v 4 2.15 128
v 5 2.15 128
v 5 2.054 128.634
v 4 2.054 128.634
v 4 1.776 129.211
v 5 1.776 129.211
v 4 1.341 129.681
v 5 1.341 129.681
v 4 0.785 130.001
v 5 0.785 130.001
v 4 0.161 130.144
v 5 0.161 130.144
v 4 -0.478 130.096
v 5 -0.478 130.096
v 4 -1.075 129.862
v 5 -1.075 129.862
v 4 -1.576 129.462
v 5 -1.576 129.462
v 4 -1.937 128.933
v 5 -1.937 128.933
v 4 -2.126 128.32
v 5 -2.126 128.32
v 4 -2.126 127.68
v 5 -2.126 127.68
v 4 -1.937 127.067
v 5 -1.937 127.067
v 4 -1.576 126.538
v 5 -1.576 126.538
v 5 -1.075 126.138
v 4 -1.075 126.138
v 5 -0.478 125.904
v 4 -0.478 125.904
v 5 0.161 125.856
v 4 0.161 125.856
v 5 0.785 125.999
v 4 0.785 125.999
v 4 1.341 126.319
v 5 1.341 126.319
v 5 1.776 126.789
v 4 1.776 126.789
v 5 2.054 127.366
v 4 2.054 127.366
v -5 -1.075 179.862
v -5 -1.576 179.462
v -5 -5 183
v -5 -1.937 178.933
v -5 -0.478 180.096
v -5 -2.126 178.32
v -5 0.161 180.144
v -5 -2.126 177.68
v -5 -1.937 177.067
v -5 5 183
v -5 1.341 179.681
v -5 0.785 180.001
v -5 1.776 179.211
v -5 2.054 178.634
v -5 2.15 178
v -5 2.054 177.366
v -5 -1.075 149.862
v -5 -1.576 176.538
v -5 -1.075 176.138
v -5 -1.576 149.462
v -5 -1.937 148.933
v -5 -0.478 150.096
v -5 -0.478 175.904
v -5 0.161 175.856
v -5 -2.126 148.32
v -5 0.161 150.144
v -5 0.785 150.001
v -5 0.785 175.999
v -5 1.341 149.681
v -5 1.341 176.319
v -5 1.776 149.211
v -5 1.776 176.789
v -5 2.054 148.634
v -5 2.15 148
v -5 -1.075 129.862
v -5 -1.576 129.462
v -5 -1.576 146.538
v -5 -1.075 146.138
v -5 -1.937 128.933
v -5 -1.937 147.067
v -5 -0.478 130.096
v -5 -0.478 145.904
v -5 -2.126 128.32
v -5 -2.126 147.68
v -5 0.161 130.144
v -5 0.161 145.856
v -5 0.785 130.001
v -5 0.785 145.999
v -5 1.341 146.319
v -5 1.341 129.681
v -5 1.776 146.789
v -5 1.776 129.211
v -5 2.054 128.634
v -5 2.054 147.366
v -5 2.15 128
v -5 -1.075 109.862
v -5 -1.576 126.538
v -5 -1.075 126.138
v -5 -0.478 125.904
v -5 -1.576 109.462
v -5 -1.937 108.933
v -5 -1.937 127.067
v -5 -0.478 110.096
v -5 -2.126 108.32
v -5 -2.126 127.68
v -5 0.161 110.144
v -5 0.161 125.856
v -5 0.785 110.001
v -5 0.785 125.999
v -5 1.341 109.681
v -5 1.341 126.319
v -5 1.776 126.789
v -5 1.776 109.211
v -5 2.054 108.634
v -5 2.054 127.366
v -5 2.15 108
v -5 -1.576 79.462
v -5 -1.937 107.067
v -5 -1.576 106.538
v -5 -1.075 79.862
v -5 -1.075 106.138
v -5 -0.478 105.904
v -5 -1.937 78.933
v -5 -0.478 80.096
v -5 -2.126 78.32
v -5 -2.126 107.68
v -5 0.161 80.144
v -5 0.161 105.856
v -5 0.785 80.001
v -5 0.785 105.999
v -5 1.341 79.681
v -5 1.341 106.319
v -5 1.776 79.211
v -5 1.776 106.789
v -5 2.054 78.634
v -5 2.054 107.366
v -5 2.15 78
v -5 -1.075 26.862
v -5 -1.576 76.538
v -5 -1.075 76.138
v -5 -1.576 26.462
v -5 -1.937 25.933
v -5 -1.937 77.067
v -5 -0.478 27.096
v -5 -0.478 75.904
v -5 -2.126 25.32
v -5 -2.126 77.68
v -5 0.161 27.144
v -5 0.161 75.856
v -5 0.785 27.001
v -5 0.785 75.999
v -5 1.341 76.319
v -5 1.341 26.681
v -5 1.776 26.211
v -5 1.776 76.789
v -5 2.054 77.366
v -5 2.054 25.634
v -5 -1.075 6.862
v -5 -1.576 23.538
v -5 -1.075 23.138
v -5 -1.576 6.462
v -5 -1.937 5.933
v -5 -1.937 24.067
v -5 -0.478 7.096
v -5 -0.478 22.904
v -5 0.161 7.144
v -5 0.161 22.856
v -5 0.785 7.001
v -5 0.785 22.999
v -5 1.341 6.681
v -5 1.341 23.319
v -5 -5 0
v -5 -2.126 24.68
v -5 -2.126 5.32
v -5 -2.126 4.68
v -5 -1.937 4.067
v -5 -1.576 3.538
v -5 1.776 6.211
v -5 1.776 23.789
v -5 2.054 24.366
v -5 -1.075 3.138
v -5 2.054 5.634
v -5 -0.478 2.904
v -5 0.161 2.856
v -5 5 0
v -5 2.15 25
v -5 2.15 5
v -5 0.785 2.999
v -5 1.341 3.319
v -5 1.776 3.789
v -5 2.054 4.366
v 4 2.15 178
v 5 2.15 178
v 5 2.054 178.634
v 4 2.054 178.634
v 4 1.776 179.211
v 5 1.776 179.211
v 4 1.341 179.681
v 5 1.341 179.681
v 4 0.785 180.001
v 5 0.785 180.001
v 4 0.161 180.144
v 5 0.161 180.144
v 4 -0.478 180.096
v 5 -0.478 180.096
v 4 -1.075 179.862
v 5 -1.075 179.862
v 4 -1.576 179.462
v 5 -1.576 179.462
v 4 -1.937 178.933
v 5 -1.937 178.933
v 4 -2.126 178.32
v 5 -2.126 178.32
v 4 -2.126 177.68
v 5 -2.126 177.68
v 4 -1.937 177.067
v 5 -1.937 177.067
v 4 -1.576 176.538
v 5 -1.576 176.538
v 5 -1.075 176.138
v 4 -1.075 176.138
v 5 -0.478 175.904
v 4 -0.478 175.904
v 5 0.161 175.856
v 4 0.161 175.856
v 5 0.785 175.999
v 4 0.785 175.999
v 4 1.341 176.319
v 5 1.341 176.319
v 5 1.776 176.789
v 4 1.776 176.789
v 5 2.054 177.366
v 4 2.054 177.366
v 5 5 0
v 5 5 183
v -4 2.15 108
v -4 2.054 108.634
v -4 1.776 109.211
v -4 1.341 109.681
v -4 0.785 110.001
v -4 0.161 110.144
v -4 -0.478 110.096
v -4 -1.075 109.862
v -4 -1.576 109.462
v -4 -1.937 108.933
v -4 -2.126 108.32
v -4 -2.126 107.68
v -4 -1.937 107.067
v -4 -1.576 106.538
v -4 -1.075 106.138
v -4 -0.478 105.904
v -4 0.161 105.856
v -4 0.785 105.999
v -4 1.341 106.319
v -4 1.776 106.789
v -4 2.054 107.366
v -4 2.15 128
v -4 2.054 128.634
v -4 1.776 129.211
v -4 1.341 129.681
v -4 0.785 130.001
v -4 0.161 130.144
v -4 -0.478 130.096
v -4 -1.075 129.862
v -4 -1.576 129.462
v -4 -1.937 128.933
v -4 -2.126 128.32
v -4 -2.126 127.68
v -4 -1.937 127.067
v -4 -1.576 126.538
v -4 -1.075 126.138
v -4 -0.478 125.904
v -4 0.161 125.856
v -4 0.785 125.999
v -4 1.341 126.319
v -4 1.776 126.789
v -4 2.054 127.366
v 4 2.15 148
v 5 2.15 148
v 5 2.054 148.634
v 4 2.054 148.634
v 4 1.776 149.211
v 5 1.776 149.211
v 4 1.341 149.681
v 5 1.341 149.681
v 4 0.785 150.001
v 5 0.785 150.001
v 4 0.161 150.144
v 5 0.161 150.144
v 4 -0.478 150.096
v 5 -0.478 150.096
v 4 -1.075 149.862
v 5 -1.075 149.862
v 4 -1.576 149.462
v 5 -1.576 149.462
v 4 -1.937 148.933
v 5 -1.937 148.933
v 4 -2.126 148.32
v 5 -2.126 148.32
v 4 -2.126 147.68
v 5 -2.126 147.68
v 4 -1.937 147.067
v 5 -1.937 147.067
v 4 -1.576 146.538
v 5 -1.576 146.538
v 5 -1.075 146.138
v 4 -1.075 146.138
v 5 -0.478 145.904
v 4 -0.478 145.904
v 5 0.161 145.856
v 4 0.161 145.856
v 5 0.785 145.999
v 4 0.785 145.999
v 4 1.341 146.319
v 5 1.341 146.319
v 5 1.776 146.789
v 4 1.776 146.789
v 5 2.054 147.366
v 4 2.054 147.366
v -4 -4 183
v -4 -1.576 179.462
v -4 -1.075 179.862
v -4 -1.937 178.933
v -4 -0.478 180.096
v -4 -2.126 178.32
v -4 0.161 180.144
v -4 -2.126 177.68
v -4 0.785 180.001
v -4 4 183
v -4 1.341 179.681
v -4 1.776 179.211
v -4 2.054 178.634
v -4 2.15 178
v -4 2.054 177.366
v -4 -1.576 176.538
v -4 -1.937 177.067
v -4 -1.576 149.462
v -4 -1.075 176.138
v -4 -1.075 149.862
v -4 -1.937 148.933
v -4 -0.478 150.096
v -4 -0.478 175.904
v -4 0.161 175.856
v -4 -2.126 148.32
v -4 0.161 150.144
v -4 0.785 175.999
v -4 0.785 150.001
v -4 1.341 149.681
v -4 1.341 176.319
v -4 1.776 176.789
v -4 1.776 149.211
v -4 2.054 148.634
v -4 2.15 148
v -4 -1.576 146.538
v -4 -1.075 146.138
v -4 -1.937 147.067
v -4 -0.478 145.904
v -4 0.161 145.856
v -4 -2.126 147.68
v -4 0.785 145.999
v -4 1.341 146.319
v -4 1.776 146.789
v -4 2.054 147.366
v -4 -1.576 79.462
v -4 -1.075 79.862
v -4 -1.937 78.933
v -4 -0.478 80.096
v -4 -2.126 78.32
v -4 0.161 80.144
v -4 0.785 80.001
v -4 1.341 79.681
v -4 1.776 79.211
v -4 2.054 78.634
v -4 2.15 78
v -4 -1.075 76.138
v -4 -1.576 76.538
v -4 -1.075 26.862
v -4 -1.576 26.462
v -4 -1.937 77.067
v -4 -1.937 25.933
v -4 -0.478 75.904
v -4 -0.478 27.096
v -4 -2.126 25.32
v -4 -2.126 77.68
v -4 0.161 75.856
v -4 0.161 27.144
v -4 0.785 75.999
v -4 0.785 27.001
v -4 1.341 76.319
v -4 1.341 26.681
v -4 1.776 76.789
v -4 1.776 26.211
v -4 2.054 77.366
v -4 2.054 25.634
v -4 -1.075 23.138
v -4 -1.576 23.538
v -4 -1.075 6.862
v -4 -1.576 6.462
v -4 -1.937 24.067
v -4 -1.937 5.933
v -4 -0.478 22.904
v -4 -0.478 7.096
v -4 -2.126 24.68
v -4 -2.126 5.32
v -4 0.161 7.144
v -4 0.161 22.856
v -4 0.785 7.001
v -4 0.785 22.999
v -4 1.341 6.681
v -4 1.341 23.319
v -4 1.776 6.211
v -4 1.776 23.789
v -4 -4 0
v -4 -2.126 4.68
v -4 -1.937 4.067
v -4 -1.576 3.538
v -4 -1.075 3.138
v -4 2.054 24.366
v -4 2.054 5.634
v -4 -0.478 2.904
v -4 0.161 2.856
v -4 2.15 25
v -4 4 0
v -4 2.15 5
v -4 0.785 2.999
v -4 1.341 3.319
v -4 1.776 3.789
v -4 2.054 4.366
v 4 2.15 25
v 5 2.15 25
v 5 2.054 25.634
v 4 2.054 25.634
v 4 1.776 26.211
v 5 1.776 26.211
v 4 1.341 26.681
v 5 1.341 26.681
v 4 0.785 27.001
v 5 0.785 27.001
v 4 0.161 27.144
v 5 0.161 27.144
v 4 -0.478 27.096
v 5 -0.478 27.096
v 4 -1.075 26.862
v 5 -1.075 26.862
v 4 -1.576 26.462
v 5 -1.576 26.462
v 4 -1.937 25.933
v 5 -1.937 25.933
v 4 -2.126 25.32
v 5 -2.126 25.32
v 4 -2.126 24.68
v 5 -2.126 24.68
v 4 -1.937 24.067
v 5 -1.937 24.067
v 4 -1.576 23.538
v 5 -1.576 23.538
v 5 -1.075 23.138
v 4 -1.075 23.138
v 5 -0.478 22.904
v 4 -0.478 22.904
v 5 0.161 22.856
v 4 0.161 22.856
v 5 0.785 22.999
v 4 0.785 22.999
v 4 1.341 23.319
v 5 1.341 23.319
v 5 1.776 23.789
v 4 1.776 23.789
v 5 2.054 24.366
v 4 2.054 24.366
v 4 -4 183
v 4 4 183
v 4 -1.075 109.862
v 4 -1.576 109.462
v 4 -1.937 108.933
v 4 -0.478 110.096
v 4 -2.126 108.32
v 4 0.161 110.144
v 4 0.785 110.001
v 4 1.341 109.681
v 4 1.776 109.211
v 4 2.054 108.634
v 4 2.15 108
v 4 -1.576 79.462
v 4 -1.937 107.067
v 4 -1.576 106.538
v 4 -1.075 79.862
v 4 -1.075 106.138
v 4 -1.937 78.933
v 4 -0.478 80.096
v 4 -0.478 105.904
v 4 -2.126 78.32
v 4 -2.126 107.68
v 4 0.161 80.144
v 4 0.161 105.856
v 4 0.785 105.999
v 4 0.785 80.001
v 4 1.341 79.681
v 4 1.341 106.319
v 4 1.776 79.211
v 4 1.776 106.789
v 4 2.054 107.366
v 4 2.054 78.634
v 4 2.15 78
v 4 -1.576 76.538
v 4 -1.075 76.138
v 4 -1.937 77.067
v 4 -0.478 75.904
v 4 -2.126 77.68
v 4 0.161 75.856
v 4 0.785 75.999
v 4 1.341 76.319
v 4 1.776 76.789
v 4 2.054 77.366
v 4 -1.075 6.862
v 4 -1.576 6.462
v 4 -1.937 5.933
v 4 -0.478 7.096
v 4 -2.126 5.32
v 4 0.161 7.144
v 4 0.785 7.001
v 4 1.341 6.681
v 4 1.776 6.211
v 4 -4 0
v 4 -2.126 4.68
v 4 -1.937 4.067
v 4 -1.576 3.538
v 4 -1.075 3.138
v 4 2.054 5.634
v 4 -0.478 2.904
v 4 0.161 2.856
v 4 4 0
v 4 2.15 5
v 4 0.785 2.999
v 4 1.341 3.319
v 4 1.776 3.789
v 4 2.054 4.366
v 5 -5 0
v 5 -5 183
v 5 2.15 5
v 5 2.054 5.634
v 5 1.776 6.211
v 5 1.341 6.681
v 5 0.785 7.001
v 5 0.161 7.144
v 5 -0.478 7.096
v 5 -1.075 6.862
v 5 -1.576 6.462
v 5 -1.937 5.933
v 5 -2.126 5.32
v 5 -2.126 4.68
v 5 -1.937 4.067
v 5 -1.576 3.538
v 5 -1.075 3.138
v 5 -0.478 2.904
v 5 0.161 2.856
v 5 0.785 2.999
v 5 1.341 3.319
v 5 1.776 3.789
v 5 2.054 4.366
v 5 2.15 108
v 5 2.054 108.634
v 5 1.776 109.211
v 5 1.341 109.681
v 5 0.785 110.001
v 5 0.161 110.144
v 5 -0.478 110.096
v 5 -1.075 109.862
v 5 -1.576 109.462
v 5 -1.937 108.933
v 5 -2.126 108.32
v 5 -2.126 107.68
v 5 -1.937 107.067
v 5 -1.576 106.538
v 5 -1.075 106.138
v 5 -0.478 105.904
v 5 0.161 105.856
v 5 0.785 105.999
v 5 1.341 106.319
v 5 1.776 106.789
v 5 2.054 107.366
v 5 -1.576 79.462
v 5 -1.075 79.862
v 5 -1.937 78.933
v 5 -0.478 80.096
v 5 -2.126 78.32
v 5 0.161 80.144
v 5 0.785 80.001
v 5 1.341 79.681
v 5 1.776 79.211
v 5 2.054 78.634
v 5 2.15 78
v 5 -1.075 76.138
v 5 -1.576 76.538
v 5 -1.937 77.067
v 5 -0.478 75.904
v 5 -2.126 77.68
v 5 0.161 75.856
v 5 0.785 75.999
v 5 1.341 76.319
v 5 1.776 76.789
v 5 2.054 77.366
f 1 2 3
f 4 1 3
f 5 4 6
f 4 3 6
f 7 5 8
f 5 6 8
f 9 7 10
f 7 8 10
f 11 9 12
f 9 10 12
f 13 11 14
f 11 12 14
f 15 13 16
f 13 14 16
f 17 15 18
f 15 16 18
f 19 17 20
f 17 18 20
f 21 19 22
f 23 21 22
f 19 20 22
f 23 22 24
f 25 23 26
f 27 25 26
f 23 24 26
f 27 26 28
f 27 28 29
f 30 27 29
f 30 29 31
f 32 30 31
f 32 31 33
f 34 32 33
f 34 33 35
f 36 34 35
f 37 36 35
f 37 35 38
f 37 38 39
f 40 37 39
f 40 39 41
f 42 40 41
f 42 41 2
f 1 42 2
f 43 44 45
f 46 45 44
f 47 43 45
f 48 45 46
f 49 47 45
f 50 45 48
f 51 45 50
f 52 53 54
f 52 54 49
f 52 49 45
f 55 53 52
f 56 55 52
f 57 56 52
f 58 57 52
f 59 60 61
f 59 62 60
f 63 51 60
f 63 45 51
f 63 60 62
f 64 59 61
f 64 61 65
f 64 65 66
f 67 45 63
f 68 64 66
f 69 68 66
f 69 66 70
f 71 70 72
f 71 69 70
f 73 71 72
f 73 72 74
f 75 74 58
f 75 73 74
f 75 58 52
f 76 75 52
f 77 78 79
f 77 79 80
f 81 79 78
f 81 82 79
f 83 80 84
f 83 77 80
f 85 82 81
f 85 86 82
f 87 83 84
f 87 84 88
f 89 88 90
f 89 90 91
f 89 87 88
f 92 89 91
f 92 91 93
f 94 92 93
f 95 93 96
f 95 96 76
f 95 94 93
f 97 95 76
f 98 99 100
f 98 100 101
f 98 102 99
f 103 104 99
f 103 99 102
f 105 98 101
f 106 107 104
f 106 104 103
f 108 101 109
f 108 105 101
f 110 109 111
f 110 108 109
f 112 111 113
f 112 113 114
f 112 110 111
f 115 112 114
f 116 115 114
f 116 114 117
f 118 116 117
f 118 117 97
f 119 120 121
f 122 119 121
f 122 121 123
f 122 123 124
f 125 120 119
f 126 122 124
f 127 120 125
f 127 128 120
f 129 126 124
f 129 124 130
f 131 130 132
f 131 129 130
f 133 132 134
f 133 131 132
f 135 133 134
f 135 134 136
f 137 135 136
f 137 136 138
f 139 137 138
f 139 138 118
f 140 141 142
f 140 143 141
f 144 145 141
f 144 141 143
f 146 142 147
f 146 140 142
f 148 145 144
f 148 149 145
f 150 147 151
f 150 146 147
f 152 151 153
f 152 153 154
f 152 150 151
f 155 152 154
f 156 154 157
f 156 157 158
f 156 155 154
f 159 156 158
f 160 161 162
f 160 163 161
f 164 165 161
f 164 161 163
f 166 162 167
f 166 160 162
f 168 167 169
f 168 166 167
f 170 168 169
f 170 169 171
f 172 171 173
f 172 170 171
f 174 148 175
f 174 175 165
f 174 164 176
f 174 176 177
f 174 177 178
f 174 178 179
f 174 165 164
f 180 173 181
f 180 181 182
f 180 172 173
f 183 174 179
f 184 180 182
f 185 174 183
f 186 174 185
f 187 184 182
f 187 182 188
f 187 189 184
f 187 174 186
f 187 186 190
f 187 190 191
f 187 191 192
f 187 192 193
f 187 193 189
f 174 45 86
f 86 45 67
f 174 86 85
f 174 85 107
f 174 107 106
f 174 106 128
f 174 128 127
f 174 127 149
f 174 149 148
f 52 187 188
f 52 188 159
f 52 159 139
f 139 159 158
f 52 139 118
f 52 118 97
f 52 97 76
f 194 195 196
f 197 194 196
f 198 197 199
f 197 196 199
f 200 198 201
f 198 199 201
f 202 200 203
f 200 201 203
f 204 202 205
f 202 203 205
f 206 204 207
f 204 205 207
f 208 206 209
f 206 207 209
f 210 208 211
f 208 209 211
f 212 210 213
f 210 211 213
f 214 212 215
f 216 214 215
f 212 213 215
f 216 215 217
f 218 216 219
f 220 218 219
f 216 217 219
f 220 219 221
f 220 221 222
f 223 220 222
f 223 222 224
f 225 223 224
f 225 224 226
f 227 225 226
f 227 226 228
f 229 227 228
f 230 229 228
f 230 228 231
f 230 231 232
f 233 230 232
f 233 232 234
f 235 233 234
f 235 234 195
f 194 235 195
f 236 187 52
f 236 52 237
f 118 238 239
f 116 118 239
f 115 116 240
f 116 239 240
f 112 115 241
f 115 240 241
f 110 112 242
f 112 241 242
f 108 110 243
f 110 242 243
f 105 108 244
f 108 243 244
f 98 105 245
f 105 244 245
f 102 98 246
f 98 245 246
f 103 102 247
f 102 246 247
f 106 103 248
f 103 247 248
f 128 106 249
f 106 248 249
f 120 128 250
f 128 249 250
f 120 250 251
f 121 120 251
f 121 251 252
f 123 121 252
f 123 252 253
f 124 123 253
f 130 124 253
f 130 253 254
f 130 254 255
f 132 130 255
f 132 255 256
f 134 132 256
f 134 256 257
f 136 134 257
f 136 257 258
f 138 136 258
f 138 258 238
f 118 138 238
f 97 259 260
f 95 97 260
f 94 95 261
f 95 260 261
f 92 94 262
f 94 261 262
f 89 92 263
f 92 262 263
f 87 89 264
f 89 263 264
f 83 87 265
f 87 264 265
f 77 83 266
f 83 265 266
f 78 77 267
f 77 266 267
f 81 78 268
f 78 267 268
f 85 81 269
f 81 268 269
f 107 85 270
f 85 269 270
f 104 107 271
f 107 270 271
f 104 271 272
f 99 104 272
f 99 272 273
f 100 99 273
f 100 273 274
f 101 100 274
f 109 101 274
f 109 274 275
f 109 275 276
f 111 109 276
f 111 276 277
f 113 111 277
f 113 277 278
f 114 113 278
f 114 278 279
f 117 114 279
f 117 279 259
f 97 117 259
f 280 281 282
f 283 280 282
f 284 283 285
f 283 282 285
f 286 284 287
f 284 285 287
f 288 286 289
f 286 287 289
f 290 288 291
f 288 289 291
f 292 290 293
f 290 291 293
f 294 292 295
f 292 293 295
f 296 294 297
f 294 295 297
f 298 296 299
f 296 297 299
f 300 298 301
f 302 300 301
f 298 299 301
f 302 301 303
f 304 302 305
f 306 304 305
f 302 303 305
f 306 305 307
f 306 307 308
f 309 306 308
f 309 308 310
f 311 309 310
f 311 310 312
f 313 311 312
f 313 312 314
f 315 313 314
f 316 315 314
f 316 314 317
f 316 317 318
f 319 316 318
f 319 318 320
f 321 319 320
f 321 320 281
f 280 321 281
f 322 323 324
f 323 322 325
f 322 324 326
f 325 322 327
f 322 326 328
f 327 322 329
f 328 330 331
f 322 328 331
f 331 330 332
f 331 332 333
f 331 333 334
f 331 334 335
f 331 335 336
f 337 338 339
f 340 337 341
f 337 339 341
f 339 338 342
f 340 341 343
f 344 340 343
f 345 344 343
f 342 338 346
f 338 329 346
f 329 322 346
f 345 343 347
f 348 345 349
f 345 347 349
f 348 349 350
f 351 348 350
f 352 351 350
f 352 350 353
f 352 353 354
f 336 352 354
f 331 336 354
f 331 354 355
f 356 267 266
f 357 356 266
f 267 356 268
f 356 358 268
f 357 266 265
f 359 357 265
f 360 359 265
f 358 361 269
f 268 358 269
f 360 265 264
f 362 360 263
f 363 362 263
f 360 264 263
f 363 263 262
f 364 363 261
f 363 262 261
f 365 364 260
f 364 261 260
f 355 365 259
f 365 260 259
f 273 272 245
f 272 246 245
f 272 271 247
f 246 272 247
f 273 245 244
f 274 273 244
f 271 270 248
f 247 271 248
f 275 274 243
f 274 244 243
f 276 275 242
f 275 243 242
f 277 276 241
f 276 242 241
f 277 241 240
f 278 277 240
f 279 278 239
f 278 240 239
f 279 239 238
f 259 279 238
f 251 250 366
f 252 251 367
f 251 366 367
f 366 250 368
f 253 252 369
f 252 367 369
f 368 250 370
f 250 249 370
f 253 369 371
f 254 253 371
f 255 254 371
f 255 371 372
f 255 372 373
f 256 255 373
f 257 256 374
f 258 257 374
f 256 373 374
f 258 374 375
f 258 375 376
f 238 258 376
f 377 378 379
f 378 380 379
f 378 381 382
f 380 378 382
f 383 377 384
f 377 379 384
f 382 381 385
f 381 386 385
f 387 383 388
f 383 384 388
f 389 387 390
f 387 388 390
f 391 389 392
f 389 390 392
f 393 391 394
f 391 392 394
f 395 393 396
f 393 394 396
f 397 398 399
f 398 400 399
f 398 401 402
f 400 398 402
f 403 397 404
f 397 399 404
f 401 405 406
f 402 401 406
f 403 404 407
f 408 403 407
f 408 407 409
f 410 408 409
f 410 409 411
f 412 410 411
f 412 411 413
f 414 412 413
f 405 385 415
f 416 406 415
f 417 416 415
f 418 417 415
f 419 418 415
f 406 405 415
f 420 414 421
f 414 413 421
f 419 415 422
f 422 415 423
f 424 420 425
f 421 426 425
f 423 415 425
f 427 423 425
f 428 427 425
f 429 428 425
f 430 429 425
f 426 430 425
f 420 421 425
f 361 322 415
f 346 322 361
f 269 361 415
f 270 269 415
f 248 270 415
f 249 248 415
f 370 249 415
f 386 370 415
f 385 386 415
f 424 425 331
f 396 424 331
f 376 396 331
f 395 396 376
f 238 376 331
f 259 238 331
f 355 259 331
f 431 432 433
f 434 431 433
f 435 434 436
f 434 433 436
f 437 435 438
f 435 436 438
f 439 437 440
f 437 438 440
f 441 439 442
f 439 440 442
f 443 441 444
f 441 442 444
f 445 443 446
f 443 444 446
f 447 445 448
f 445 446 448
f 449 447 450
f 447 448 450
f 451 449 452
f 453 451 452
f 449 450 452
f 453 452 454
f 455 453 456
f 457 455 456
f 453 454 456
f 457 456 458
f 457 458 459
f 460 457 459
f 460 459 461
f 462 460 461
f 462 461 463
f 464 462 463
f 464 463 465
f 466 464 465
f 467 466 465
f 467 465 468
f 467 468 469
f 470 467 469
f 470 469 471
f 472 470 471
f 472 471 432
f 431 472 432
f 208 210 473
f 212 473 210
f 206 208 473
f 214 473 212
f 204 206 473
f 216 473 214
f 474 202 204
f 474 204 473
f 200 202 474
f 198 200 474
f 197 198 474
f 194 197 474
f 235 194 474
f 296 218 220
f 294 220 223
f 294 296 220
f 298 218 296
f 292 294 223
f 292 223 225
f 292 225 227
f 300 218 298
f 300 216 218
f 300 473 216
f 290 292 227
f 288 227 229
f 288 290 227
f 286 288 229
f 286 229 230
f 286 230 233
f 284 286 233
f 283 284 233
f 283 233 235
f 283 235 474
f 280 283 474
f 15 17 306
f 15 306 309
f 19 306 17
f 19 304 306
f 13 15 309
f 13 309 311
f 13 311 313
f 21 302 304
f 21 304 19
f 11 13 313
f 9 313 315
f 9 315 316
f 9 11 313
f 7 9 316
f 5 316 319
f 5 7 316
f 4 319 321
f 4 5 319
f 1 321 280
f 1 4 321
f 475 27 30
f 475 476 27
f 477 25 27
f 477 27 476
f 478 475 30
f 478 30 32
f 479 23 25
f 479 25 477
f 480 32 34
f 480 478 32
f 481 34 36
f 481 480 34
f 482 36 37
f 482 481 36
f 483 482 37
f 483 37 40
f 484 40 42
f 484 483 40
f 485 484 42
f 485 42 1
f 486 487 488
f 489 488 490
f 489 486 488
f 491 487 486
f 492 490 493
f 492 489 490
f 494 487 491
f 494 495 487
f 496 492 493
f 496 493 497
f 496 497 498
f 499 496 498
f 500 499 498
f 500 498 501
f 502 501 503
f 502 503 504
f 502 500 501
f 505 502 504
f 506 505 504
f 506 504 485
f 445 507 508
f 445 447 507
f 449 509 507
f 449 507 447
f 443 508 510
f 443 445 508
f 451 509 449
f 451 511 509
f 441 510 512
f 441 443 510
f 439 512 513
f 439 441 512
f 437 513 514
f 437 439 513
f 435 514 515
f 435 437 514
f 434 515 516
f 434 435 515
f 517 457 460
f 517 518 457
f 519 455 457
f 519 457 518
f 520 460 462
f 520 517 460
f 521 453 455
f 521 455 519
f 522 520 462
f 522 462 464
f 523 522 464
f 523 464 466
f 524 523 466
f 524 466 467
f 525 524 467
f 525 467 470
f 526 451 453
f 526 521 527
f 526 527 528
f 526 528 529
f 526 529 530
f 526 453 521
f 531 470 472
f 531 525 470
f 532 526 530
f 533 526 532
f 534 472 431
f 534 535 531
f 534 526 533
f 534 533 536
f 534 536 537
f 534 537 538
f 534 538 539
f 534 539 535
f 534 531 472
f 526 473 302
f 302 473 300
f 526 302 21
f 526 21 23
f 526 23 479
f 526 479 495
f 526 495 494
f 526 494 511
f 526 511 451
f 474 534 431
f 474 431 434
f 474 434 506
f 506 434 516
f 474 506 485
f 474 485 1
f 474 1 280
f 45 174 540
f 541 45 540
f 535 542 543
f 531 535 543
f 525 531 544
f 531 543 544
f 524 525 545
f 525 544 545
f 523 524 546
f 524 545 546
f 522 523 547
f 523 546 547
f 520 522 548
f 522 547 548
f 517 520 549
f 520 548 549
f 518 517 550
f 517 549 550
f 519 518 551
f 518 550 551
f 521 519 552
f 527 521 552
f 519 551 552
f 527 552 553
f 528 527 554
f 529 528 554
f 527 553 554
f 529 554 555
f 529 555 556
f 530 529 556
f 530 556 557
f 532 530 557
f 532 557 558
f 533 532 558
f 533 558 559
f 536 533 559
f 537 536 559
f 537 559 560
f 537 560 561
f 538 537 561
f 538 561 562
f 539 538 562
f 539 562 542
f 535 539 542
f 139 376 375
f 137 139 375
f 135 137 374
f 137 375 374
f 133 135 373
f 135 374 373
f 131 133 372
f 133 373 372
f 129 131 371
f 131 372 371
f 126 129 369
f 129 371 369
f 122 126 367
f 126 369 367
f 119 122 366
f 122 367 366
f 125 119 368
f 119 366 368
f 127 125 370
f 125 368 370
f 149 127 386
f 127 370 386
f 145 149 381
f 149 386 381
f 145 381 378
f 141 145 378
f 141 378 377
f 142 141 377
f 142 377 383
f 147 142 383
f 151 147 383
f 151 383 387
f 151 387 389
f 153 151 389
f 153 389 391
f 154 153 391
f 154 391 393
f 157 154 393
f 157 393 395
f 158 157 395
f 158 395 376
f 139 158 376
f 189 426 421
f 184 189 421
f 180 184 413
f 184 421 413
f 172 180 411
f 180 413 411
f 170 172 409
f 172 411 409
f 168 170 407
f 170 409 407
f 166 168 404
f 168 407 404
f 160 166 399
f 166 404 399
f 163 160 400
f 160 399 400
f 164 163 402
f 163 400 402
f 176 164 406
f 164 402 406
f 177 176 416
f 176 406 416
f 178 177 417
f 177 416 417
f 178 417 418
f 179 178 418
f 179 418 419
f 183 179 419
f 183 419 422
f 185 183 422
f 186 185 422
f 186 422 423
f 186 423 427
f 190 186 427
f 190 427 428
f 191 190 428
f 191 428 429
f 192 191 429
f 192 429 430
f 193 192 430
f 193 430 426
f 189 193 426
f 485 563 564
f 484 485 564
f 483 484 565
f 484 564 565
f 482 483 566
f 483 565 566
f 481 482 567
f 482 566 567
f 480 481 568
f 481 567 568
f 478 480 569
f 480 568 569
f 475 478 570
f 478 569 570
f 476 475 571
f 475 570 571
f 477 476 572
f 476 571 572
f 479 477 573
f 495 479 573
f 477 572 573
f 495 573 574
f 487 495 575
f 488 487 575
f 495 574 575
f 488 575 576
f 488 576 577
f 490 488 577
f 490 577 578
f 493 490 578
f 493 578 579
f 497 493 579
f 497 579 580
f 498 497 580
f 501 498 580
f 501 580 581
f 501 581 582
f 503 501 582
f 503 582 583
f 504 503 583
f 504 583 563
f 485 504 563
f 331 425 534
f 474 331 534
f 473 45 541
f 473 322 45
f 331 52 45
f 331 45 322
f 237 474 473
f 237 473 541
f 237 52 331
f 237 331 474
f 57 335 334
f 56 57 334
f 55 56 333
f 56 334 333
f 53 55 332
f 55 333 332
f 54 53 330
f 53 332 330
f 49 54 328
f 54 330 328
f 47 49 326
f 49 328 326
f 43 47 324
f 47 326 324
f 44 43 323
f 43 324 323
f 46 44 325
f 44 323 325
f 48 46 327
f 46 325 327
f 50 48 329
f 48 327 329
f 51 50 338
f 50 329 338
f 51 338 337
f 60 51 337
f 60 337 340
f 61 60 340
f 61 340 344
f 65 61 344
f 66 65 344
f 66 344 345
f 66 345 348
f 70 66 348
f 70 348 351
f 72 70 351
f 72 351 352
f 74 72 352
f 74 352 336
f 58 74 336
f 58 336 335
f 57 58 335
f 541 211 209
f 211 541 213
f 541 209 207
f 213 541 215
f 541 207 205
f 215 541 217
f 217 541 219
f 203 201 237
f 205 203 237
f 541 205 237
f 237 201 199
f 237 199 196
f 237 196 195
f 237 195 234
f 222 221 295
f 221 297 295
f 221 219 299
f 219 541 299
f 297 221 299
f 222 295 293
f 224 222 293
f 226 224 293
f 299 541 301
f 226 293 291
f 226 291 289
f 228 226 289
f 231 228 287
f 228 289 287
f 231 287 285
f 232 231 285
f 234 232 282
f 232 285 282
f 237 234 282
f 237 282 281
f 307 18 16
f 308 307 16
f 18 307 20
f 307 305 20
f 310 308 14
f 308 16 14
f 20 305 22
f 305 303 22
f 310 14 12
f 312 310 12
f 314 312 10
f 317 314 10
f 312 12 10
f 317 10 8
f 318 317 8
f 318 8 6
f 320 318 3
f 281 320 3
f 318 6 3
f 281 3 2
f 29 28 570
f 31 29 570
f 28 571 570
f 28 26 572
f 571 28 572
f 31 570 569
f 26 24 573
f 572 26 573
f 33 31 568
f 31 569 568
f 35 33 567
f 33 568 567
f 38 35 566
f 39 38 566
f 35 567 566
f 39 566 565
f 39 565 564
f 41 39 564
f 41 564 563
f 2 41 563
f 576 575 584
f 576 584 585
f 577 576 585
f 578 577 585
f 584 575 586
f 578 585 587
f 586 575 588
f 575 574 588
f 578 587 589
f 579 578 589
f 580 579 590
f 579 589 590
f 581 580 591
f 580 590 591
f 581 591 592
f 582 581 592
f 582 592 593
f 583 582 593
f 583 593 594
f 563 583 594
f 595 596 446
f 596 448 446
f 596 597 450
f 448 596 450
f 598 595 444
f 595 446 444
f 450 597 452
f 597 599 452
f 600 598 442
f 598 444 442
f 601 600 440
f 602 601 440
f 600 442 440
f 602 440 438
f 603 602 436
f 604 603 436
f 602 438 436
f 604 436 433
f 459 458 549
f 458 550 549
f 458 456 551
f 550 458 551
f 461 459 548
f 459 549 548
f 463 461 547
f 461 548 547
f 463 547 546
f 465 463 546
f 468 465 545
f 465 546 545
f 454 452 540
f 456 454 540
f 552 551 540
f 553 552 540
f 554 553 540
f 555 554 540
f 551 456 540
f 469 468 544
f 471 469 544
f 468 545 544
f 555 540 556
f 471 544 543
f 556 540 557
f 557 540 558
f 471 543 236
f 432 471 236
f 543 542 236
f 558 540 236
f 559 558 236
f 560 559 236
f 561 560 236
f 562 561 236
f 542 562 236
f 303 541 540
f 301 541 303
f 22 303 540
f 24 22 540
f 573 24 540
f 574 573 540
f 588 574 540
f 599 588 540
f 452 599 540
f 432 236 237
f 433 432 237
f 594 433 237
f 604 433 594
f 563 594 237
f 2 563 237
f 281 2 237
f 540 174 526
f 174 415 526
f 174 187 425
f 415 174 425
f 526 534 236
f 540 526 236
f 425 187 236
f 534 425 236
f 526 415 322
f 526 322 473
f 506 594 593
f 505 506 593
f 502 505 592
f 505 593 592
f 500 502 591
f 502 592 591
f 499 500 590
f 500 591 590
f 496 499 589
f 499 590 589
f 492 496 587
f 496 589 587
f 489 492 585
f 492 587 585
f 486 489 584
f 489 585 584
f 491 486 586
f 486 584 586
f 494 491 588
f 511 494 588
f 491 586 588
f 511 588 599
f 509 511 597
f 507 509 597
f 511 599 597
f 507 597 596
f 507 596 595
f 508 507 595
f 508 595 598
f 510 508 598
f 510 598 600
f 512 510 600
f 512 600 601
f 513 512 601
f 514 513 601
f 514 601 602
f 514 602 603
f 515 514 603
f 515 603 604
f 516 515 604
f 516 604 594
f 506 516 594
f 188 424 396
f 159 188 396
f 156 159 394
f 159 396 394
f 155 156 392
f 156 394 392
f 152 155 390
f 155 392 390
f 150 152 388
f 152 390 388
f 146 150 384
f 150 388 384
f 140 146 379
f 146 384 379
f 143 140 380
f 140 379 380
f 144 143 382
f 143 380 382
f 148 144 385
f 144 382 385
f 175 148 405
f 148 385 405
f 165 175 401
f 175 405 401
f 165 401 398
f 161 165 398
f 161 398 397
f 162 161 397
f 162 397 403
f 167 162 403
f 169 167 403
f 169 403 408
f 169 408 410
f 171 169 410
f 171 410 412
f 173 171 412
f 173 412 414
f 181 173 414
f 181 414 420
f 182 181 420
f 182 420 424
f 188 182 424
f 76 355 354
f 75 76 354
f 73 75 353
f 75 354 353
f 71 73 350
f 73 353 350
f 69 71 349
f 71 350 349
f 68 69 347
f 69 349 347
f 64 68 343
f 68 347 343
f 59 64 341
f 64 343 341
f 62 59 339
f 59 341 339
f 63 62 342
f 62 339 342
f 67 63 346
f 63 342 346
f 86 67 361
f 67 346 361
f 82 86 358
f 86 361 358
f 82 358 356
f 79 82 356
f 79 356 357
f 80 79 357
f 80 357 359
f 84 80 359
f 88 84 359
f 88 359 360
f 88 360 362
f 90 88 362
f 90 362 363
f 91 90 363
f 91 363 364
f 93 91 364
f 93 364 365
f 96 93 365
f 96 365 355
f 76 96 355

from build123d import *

# Parameters (mm, degrees)
SKETCH_1_W          = 10
SKETCH_1_H          = 10
SKETCH_1_W_2        = 8
SKETCH_1_H_2        = 8
EXTRUDE_1_DEPTH     = 183
SKETCH_2_R          = 2.15
CUT_EXTRUDE_1_DEPTH = 184.341211952


with BuildPart() as part:
    # ｽｹｯﾁ1 → 押し出し-薄板1 (new body)
    with BuildSketch(Plane.XY):
        Rectangle(SKETCH_1_W, SKETCH_1_H)
        Rectangle(SKETCH_1_W_2, SKETCH_1_H_2, mode=Mode.SUBTRACT)
    extrude(amount=EXTRUDE_1_DEPTH)

    # ｽｹｯﾁ2 → ｶｯﾄ - 押し出し1 (cut, through all)
    with BuildSketch(Plane(origin=(5, 0, 0), x_dir=(0, 0, -1), z_dir=(1, 0, 0))):
        with Locations(Location((-128, 0, 0), (0, 0, 90))):
            Circle(SKETCH_2_R)
        with Locations(Location((-108, 0, 0), (0, 0, 90))):
            Circle(SKETCH_2_R)
        with Locations(Location((-148, 0, 0), (0, 0, 90))):
            Circle(SKETCH_2_R)
        with Locations(Location((-178, 0, 0), (0, 0, 90))):
            Circle(SKETCH_2_R)
        with Locations(Location((-78, 0, 0), (0, 0, 90))):
            Circle(SKETCH_2_R)
        with Locations(Location((-5, 0, 0), (0, 0, 90))):
            Circle(SKETCH_2_R)
        with Locations(Location((-25, 0, 0), (0, 0, 90))):
            Circle(SKETCH_2_R)
    extrude(amount=-CUT_EXTRUDE_1_DEPTH, mode=Mode.SUBTRACT)


solid = part.part
